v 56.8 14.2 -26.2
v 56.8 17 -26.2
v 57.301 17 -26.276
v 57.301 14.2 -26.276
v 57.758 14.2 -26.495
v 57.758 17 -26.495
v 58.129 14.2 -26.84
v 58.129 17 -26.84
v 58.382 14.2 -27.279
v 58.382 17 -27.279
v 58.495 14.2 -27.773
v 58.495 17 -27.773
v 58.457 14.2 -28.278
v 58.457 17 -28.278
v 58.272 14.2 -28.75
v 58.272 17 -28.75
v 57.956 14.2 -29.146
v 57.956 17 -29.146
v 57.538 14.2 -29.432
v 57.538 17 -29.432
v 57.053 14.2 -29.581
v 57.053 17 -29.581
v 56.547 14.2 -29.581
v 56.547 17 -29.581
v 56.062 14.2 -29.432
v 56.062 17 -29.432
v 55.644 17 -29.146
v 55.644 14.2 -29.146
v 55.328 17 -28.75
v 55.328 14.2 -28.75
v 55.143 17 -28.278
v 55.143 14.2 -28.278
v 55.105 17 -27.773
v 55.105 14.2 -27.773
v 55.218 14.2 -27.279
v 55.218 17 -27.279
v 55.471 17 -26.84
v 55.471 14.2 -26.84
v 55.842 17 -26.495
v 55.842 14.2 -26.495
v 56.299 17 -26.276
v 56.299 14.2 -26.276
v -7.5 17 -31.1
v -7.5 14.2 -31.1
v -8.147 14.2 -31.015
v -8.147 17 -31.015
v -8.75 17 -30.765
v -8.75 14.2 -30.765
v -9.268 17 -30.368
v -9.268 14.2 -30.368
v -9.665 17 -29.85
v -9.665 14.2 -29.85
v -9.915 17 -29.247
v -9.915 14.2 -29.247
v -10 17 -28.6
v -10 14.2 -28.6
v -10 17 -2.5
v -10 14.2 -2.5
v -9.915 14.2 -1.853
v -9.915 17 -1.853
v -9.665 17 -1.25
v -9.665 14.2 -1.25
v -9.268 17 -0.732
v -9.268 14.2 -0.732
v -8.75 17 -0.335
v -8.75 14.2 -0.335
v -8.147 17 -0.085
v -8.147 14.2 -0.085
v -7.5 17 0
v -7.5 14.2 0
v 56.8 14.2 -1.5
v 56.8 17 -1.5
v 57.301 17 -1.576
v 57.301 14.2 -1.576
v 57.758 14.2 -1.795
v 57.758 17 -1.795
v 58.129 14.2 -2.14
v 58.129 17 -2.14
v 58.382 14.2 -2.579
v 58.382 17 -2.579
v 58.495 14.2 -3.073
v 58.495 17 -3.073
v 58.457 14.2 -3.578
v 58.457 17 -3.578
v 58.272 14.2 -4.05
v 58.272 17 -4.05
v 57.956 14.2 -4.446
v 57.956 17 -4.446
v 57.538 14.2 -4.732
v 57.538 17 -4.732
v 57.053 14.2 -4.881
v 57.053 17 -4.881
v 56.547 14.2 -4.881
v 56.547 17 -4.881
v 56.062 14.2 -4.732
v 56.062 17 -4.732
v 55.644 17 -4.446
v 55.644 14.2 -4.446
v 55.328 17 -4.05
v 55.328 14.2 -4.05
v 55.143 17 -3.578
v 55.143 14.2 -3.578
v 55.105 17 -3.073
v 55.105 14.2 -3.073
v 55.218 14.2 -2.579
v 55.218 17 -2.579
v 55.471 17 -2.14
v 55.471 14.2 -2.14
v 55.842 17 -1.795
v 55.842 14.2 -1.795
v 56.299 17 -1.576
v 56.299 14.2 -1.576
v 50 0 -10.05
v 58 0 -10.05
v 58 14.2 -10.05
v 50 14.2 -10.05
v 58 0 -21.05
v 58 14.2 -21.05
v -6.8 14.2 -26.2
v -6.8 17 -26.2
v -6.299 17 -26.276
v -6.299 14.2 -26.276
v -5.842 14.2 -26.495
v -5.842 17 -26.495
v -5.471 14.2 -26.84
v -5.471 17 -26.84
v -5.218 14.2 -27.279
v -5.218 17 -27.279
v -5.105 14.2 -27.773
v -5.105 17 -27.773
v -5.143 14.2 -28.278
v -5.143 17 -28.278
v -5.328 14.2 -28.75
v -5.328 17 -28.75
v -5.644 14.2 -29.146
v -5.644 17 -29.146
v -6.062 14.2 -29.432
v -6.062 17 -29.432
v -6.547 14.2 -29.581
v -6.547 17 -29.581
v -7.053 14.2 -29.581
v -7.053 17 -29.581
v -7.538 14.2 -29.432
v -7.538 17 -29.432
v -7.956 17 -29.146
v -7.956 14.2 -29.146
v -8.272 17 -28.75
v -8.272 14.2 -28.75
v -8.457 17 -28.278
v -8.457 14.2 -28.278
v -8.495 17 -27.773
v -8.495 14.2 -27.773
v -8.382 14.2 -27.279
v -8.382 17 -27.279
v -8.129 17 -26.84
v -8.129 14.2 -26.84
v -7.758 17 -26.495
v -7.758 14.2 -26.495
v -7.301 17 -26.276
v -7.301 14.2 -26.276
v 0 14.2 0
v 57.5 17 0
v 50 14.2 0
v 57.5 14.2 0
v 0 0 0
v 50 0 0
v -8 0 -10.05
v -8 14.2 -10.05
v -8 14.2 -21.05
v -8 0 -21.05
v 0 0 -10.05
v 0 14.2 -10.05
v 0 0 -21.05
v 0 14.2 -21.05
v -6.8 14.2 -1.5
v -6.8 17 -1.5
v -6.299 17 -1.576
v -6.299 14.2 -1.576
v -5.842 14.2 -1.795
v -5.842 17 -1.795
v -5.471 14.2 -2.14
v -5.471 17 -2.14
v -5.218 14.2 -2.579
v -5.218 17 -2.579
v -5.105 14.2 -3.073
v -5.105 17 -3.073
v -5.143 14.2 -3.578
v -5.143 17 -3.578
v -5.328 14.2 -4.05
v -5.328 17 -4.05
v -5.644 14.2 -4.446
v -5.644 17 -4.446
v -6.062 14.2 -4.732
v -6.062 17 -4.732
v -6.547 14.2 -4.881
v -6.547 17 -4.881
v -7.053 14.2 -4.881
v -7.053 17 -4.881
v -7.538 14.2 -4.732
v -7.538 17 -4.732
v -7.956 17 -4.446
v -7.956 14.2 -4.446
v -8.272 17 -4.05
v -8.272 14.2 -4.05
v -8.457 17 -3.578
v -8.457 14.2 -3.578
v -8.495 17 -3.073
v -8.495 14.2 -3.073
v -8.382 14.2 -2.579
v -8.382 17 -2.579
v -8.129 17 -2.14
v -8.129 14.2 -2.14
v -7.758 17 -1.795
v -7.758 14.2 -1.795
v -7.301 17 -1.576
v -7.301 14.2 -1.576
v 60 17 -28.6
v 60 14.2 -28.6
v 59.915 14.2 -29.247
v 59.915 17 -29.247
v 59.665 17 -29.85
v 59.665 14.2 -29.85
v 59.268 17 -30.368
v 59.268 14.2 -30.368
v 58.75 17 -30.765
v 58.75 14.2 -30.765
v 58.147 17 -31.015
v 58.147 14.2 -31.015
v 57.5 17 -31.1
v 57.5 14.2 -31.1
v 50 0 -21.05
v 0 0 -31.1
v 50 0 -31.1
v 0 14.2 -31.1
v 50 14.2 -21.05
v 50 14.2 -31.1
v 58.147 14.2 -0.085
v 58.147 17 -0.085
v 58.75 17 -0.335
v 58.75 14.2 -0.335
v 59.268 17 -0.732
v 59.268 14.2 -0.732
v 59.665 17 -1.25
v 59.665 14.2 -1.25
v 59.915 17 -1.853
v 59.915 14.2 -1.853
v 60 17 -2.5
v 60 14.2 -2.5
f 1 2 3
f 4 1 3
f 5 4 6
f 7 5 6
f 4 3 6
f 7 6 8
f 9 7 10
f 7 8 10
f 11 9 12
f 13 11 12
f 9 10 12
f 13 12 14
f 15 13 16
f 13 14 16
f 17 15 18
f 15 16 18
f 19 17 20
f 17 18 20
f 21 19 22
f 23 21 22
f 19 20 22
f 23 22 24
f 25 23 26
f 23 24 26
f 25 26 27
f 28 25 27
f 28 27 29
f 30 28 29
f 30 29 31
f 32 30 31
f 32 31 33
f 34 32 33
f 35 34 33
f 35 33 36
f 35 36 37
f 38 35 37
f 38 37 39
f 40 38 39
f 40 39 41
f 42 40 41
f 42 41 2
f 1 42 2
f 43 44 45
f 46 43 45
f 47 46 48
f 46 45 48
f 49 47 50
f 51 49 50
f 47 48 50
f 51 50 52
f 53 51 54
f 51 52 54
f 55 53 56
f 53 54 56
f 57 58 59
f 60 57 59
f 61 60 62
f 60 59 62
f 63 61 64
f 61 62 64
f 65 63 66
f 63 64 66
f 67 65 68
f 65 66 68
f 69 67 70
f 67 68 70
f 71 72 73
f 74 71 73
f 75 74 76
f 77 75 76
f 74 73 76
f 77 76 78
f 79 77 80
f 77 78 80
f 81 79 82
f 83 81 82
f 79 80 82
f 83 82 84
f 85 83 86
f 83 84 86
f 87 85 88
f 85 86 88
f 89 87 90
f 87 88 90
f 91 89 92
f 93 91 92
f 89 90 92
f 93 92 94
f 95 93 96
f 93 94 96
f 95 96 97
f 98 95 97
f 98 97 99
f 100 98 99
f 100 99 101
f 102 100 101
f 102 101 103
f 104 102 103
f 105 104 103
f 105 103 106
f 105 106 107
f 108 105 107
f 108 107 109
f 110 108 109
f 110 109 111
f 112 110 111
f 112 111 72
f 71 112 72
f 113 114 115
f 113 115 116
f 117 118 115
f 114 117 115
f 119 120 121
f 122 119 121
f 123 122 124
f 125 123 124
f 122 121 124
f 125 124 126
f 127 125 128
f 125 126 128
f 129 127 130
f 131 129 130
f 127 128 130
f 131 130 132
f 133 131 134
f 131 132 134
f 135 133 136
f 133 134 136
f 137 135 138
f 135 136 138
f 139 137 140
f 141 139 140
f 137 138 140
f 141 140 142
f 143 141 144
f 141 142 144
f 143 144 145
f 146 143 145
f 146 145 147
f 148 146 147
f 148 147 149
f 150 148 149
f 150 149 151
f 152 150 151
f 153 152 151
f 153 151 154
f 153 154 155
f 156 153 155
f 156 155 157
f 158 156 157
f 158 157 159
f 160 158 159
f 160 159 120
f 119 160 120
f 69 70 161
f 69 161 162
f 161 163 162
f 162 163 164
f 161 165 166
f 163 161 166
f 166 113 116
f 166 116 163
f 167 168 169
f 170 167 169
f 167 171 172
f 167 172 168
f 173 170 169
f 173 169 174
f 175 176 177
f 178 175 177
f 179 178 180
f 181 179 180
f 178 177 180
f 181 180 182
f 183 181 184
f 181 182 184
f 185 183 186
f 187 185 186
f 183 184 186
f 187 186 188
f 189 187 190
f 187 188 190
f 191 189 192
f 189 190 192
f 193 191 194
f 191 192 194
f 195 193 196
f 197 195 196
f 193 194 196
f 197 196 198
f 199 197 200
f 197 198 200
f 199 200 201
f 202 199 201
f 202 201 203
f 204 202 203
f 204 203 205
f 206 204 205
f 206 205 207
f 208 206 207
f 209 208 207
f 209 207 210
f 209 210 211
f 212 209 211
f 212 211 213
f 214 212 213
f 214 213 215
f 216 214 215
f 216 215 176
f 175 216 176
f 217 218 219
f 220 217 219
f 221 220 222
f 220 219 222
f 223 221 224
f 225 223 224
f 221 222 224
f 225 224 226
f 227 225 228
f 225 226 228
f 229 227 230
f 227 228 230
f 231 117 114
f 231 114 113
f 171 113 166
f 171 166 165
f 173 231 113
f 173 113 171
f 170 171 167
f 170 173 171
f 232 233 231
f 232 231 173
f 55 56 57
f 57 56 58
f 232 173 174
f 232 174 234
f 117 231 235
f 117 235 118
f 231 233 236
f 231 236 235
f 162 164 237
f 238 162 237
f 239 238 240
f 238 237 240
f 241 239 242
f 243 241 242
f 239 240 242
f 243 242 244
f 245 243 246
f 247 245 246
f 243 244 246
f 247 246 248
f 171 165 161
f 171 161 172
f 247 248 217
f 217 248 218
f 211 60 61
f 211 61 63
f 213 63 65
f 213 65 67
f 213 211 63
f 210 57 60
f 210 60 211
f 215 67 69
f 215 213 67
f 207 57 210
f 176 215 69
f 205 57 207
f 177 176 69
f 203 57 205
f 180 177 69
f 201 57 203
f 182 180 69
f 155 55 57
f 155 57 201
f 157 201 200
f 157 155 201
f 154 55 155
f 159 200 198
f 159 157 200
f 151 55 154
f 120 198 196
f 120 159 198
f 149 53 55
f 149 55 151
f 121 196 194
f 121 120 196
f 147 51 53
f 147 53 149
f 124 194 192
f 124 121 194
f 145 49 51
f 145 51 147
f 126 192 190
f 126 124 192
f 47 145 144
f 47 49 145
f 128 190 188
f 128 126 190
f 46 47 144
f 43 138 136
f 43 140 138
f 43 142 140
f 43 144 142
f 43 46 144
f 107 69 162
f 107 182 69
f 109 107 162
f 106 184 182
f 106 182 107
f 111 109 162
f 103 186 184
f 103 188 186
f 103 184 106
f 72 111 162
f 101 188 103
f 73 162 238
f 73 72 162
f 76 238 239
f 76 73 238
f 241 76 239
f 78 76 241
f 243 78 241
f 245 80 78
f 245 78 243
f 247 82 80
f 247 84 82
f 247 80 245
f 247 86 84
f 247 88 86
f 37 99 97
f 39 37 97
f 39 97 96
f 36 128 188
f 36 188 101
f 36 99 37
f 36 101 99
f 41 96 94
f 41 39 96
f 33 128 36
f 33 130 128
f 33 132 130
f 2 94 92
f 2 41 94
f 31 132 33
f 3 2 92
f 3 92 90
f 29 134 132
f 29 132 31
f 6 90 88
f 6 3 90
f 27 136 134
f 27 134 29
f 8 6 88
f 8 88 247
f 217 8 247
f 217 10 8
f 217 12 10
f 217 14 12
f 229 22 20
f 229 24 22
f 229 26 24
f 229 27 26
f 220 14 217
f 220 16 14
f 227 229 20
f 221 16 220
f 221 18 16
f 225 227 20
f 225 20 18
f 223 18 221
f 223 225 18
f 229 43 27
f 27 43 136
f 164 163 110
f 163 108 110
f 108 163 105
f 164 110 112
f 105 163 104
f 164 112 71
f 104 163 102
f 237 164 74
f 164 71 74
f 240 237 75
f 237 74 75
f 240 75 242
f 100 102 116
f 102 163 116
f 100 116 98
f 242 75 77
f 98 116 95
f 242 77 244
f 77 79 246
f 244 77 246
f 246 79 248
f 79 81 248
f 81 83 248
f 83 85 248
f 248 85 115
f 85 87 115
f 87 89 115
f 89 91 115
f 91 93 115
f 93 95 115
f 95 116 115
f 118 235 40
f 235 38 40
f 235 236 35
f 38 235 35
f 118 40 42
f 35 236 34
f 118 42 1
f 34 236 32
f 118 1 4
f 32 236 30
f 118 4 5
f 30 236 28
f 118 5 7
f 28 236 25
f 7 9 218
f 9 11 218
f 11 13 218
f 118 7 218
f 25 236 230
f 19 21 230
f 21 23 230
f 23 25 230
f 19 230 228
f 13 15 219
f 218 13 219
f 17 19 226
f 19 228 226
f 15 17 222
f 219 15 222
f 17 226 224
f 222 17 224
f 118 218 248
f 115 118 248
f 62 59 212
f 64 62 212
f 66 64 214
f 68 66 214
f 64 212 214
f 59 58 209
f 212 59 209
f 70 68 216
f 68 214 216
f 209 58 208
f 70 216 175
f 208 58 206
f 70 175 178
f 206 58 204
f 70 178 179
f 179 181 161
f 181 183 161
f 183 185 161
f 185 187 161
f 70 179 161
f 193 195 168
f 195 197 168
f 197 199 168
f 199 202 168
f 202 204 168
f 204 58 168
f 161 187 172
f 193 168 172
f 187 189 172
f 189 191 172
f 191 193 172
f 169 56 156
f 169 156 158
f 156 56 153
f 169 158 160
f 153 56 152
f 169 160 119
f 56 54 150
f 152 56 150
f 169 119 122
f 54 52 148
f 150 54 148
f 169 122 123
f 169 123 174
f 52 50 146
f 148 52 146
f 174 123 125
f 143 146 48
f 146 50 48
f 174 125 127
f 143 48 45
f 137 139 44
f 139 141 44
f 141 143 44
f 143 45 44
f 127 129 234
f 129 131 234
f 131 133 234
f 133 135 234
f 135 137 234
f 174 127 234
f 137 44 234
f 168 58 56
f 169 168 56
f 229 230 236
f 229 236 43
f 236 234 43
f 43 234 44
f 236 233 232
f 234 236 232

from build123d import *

# Parameters (mm, degrees)
BOSS_EXTRUDE1_DEPTH = 14.2
BOSS_EXTRUDE2_DEPTH = 2.8
SKETCH3_R           = 1.7
CUT_EXTRUDE2_DEPTH  = 70.686512325


with BuildPart() as part:
    # Sketch1 → Boss-Extrude1 (new body)
    with BuildSketch(Plane(origin=(0, 0, 0), x_dir=(1, 0, 0), z_dir=(0, 1, 0))):
        Polygon((0, 21.05), (0, 31.1), (50, 31.1), (50, 21.05), (58, 21.05), (58, 10.05), (50, 10.05), (50, 0), (0, 0), (0, 10.05), (-8, 10.05), (-8, 21.05), align=None)
    extrude(amount=BOSS_EXTRUDE1_DEPTH)

    # Sketch2 → Boss-Extrude2 (add)
    with BuildSketch(Plane(origin=(0, 14.2, 0), x_dir=(1, 0, 0), z_dir=(0, 1, 0))):
        with BuildLine():
            Line((57.5, 31.1), (-7.5, 31.1))
            ThreePointArc((-7.5, 31.1), (-9.267766953, 30.367766953), (-10, 28.6))
            Line((-10, 28.6), (-10, 2.5))
            ThreePointArc((-10, 2.5), (-9.267766953, 0.732233047), (-7.5, 0))
            Line((-7.5, 0), (57.5, 0))
            ThreePointArc((57.5, 0), (59.267766953, 0.732233047), (60, 2.5))
            Line((60, 2.5), (60, 28.6))
            ThreePointArc((60, 28.6), (59.267766953, 30.367766953), (57.5, 31.1))
        make_face()
    extrude(amount=BOSS_EXTRUDE2_DEPTH)

    # Sketch3 → Cut-Extrude2 (cut, through all)
    with BuildSketch(Plane(origin=(0, 17, 0), x_dir=(1, 0, 0), z_dir=(0, 1, 0))):
        with Locations(Location((-6.8, 3.2, 0), (0, 0, 270))):
            Circle(SKETCH3_R)
        with Locations(Location((56.8, 3.2, 0), (0, 0, 270))):
            Circle(SKETCH3_R)
        with Locations(Location((56.8, 27.9, 0), (0, 0, 270))):
            Circle(SKETCH3_R)
        with Locations(Location((-6.8, 27.9, 0), (0, 0, 270))):
            Circle(SKETCH3_R)
    extrude(amount=-CUT_EXTRUDE2_DEPTH, mode=Mode.SUBTRACT)


solid = part.part
